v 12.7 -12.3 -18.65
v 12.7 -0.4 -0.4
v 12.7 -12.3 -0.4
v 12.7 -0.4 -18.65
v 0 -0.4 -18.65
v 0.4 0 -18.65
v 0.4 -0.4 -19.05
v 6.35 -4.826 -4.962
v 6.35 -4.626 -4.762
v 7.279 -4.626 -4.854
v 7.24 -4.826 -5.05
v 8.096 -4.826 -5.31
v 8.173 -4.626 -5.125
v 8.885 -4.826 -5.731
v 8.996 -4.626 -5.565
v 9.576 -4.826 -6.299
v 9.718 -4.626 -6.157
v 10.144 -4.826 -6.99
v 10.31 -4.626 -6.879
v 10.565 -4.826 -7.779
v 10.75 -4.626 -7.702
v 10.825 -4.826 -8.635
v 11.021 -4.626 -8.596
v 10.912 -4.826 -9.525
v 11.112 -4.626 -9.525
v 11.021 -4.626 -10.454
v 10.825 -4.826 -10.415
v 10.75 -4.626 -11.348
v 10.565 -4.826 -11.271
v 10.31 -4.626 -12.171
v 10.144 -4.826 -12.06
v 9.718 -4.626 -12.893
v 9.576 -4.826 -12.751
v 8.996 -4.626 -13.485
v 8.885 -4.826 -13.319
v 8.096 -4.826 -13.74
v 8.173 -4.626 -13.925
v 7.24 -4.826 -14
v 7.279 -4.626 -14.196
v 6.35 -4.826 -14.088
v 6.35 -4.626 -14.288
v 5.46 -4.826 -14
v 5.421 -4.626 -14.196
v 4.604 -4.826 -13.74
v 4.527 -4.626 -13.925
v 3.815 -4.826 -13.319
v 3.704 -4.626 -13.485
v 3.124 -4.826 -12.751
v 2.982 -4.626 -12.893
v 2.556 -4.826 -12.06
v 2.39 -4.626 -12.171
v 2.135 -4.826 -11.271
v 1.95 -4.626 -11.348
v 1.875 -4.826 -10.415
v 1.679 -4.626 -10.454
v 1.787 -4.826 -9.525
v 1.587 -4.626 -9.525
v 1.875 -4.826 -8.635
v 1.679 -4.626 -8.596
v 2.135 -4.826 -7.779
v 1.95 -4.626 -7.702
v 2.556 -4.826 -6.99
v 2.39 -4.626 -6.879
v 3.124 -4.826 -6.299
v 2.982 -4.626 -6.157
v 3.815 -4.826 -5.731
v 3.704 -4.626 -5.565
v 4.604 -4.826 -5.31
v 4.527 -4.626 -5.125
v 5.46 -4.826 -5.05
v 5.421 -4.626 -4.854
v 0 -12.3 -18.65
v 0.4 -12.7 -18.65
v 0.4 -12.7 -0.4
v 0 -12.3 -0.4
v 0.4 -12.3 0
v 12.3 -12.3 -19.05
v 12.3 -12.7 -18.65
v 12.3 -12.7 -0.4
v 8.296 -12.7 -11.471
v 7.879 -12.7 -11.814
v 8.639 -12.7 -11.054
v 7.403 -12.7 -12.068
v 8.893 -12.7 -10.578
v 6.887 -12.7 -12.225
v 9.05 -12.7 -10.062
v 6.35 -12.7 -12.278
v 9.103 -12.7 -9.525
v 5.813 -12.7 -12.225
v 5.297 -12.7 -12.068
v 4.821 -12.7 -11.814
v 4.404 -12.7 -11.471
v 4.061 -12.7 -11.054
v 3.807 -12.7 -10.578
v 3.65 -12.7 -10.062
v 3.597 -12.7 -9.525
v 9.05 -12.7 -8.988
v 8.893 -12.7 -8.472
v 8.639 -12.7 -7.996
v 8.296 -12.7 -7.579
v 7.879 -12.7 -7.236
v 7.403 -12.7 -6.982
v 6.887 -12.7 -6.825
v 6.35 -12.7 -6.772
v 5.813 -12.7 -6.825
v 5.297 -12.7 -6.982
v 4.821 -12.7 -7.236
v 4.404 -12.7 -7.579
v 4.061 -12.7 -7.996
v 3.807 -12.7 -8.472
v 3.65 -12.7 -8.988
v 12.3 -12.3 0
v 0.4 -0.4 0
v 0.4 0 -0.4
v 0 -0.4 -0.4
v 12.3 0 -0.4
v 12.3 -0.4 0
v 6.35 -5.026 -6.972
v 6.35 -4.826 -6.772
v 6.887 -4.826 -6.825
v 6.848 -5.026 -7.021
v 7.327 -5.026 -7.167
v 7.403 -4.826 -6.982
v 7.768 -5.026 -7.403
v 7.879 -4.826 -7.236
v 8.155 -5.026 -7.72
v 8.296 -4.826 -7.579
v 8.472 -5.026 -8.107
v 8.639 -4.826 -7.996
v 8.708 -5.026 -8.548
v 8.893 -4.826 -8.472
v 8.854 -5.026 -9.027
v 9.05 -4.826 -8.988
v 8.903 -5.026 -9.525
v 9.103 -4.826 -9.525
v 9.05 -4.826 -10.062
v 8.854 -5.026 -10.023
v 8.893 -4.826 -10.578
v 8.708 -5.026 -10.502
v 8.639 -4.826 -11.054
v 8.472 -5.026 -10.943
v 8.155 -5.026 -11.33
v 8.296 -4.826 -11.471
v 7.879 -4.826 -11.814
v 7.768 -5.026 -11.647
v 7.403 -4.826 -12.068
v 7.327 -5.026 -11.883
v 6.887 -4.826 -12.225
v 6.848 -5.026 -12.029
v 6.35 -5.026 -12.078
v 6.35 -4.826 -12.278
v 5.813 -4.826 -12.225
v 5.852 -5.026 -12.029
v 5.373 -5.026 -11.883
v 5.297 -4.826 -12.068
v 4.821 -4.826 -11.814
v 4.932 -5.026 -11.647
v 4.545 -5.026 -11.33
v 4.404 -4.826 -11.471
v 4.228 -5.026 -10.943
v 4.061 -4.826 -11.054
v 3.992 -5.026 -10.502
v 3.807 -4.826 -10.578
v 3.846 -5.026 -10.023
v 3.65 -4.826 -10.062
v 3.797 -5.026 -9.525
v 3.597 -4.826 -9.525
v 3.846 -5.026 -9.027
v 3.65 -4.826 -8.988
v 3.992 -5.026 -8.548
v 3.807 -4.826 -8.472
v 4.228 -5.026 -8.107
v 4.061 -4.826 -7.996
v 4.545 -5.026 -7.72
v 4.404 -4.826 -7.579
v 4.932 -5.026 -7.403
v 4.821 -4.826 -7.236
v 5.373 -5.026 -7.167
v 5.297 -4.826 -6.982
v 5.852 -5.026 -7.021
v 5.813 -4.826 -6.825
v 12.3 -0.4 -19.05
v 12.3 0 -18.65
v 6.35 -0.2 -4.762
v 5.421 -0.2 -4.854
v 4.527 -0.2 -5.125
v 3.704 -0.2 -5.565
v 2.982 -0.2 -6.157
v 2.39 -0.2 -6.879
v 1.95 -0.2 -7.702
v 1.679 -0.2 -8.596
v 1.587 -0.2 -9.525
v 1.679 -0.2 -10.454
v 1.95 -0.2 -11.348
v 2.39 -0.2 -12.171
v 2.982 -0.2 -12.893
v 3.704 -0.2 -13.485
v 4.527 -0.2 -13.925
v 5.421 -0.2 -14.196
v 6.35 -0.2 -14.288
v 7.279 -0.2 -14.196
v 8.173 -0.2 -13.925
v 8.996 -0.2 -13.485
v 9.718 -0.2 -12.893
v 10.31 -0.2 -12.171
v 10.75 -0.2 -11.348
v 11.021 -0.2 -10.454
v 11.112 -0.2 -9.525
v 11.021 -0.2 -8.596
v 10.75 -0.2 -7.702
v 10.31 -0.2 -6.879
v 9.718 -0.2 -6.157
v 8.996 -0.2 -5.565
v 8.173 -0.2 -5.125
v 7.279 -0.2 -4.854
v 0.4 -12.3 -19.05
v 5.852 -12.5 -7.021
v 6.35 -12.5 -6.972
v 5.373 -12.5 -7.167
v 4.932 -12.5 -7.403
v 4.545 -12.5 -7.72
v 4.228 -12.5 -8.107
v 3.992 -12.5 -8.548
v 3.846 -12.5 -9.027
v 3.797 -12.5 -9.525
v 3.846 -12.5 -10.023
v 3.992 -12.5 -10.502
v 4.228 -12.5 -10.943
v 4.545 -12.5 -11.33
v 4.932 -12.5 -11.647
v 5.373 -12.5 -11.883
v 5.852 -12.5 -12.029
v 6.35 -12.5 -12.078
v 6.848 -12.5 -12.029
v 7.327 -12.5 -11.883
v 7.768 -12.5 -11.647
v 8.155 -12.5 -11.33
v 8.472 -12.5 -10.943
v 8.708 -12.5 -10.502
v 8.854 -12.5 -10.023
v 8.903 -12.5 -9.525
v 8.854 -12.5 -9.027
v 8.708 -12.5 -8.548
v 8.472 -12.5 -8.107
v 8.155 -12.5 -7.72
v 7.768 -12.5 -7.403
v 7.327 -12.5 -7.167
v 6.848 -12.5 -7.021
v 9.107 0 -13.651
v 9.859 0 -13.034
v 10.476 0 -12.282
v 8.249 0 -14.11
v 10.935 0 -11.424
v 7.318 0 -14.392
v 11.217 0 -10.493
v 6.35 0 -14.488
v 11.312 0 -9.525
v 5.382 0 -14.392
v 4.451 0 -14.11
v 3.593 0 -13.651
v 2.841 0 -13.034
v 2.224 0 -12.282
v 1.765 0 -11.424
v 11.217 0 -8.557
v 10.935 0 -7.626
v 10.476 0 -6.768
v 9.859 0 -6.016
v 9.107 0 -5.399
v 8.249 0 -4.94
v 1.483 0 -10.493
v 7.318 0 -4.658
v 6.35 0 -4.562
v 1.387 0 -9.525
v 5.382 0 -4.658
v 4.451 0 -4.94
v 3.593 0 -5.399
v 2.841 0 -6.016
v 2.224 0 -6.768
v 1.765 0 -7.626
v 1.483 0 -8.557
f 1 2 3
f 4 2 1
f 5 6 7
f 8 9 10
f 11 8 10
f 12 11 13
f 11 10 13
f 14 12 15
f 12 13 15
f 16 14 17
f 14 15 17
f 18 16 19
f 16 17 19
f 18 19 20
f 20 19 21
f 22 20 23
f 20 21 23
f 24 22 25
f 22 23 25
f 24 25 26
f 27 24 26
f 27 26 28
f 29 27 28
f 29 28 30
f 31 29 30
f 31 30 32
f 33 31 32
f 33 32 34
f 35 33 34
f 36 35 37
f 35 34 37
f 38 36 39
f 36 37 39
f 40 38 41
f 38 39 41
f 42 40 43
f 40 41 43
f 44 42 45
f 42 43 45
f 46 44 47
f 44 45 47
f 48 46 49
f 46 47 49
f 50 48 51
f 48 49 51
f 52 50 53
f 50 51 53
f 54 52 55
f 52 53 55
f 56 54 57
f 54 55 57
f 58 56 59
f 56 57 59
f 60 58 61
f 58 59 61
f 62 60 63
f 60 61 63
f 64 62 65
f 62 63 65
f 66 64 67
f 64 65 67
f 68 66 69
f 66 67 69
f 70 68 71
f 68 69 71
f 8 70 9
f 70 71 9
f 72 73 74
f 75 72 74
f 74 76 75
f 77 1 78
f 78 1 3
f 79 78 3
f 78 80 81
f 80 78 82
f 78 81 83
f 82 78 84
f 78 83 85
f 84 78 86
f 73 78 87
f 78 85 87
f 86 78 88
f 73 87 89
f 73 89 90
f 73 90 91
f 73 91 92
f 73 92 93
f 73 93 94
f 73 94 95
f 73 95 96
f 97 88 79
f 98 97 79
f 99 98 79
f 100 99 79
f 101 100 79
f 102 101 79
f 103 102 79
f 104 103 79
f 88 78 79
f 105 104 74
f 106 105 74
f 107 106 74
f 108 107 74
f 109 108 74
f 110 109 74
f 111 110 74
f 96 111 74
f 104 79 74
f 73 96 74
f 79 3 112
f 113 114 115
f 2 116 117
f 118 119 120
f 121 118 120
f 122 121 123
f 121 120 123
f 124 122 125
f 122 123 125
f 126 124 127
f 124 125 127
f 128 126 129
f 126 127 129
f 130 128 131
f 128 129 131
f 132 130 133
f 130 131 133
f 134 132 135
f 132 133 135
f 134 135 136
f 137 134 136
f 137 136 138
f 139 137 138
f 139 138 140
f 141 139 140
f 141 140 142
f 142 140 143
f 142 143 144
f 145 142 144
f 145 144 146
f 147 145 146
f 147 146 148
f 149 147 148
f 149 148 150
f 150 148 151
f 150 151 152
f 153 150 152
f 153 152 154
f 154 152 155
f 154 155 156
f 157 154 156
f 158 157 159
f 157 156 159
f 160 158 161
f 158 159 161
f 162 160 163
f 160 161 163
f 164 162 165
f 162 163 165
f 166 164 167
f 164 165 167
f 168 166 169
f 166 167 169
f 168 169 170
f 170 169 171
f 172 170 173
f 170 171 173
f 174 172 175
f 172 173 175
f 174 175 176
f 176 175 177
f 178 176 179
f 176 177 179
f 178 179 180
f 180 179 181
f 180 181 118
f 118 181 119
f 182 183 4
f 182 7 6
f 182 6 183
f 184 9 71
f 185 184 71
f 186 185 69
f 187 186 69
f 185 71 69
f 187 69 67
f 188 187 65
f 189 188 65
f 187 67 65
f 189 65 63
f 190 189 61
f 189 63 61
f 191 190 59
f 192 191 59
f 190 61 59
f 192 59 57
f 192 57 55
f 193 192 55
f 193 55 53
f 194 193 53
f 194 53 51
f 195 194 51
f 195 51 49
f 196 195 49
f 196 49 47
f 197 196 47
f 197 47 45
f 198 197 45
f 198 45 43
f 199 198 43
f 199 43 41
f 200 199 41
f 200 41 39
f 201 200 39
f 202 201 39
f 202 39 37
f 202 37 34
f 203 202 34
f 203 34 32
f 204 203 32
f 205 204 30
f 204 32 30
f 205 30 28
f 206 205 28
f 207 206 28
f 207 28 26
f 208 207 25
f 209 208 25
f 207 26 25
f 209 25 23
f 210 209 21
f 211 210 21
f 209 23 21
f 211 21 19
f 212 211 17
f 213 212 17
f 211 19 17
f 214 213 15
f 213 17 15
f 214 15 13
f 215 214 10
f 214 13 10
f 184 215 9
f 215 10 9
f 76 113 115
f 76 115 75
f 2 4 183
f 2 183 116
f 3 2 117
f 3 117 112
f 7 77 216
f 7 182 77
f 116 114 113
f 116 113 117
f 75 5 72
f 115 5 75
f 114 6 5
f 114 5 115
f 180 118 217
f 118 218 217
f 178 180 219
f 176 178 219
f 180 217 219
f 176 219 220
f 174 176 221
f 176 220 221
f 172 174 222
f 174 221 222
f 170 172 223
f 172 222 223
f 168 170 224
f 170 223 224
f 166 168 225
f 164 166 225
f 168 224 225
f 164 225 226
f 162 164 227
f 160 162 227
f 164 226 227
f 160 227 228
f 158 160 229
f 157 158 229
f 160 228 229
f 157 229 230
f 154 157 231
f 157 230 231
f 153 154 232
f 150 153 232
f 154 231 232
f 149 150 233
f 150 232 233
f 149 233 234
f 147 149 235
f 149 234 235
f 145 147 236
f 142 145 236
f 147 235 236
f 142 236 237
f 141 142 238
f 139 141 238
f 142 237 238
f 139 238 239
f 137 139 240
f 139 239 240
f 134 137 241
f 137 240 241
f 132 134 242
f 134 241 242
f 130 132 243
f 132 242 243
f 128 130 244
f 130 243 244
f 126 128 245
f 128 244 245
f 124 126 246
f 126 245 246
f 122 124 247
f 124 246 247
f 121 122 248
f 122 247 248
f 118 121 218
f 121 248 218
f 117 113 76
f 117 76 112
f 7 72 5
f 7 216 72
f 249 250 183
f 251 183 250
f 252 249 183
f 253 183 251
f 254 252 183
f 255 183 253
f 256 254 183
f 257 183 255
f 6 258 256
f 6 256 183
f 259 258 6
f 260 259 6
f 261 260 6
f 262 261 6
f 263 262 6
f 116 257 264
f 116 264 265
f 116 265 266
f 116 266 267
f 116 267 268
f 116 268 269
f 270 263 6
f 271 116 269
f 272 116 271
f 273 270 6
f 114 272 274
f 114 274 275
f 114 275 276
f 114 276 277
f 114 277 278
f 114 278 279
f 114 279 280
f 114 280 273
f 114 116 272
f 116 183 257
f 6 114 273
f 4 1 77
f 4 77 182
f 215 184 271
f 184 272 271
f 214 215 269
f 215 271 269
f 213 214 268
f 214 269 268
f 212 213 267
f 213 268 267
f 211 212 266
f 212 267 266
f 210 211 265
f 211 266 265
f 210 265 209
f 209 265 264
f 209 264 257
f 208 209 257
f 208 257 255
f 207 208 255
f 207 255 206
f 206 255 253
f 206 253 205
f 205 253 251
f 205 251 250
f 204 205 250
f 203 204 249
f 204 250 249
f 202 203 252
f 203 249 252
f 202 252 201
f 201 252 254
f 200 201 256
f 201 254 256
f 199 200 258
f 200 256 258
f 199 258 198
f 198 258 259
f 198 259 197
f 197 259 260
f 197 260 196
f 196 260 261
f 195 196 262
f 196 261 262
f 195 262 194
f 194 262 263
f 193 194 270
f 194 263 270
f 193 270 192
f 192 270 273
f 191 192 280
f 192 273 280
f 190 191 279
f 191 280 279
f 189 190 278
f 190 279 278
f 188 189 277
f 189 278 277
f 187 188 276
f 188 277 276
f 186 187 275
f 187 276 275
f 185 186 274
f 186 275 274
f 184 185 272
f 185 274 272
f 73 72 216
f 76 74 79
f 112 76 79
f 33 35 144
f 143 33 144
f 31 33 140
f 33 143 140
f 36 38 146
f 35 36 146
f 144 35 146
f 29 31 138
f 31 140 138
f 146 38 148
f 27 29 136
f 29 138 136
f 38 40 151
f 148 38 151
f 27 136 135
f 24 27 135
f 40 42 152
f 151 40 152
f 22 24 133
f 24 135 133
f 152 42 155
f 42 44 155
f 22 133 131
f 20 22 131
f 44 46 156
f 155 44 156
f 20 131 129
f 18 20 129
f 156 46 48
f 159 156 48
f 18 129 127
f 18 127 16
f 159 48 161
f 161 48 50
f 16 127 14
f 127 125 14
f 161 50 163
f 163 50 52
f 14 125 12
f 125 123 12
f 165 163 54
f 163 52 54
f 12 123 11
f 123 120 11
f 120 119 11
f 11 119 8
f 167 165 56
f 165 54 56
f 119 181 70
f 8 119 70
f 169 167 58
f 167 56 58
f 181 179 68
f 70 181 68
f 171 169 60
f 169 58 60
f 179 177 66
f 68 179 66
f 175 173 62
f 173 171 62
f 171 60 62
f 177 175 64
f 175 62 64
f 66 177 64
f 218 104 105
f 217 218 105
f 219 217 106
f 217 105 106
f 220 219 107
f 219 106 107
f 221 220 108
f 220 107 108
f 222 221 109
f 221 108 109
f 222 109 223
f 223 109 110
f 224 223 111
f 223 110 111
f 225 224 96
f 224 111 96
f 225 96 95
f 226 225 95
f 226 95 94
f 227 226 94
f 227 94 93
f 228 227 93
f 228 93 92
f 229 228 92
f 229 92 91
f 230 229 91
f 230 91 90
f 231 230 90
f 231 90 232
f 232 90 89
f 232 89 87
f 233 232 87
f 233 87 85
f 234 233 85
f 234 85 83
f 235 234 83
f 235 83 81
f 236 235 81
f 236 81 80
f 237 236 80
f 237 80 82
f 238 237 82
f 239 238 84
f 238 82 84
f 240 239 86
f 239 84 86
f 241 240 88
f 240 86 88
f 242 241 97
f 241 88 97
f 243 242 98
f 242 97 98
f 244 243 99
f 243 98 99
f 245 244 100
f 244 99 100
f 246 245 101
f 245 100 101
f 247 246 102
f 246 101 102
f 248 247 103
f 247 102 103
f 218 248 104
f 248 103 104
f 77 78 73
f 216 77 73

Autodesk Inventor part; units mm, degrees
ref_plane "YZ Plane" through (0, 0, 0) normal (1, 0, 0) x (0, 1, 0)
ref_plane "XZ Plane" through (0, 0, 0) normal (0, 1, 0) x (-1, 0, 0)
ref_plane "XY Plane" through (0, 0, 0) normal (0, 0, 1) x (1, 0, 0)
sketch "Sketch1" plane through (0, 0, 0) normal (0, 1, 0) x (-1, 0, 0)
  line L0 (0, 0) -> (-12.7, 0)
  line L1 (-12.7, 0) -> (-12.7, -19.05)
  line L2 (-12.7, -19.05) -> (0, -19.05)
  line L3 (0, -19.05) -> (0, 0)
  line L4 (-12.7, -9.525) -> (0, -9.525)
  circle A0 centre (-6.35, -9.525) radius 3.175 construction
  dimension "d0" = 12.7
  dimension "d1" = 19.05
  dimension "d2" = 6.35
extrude "Extrusion1" add sketch "Sketch1" against normal blind 12.7
hole "Hole1" at (6.35, 0, -9.525) direction (0, -1, 0) diameter 5.1054 end through all counterbore diameter 9.525 counterbore depth 4.826 clearance for "Socket Head Cap Screw" size "#10" standard "Ansi Unified Screw Threads"
chamfer "Chamfer1" distance 0.4 angle 45 12 edges at (6.35, 0, -19.05) (12.7, 0, -9.525) (0, 0, -9.525) (6.35, 0, 0) (12.7, -6.35, 0) (12.7, -6.35, -19.05) (12.7, -12.7, -9.525) (6.35, -12.7, 0) (0, -6.35, 0) (0, -6.35, -19.05) (0, -12.7, -9.525) (6.35, -12.7, -19.05)
chamfer "Chamfer2" distance 0.2 angle 45 4 edges at (6.35, 0, -14.2875) (6.35, -12.7, -12.0777) (6.35, -4.826, -14.2875) (6.35, -4.826, -12.0777)
properties part number "Fixture Stop" material "ABS Plastic"
